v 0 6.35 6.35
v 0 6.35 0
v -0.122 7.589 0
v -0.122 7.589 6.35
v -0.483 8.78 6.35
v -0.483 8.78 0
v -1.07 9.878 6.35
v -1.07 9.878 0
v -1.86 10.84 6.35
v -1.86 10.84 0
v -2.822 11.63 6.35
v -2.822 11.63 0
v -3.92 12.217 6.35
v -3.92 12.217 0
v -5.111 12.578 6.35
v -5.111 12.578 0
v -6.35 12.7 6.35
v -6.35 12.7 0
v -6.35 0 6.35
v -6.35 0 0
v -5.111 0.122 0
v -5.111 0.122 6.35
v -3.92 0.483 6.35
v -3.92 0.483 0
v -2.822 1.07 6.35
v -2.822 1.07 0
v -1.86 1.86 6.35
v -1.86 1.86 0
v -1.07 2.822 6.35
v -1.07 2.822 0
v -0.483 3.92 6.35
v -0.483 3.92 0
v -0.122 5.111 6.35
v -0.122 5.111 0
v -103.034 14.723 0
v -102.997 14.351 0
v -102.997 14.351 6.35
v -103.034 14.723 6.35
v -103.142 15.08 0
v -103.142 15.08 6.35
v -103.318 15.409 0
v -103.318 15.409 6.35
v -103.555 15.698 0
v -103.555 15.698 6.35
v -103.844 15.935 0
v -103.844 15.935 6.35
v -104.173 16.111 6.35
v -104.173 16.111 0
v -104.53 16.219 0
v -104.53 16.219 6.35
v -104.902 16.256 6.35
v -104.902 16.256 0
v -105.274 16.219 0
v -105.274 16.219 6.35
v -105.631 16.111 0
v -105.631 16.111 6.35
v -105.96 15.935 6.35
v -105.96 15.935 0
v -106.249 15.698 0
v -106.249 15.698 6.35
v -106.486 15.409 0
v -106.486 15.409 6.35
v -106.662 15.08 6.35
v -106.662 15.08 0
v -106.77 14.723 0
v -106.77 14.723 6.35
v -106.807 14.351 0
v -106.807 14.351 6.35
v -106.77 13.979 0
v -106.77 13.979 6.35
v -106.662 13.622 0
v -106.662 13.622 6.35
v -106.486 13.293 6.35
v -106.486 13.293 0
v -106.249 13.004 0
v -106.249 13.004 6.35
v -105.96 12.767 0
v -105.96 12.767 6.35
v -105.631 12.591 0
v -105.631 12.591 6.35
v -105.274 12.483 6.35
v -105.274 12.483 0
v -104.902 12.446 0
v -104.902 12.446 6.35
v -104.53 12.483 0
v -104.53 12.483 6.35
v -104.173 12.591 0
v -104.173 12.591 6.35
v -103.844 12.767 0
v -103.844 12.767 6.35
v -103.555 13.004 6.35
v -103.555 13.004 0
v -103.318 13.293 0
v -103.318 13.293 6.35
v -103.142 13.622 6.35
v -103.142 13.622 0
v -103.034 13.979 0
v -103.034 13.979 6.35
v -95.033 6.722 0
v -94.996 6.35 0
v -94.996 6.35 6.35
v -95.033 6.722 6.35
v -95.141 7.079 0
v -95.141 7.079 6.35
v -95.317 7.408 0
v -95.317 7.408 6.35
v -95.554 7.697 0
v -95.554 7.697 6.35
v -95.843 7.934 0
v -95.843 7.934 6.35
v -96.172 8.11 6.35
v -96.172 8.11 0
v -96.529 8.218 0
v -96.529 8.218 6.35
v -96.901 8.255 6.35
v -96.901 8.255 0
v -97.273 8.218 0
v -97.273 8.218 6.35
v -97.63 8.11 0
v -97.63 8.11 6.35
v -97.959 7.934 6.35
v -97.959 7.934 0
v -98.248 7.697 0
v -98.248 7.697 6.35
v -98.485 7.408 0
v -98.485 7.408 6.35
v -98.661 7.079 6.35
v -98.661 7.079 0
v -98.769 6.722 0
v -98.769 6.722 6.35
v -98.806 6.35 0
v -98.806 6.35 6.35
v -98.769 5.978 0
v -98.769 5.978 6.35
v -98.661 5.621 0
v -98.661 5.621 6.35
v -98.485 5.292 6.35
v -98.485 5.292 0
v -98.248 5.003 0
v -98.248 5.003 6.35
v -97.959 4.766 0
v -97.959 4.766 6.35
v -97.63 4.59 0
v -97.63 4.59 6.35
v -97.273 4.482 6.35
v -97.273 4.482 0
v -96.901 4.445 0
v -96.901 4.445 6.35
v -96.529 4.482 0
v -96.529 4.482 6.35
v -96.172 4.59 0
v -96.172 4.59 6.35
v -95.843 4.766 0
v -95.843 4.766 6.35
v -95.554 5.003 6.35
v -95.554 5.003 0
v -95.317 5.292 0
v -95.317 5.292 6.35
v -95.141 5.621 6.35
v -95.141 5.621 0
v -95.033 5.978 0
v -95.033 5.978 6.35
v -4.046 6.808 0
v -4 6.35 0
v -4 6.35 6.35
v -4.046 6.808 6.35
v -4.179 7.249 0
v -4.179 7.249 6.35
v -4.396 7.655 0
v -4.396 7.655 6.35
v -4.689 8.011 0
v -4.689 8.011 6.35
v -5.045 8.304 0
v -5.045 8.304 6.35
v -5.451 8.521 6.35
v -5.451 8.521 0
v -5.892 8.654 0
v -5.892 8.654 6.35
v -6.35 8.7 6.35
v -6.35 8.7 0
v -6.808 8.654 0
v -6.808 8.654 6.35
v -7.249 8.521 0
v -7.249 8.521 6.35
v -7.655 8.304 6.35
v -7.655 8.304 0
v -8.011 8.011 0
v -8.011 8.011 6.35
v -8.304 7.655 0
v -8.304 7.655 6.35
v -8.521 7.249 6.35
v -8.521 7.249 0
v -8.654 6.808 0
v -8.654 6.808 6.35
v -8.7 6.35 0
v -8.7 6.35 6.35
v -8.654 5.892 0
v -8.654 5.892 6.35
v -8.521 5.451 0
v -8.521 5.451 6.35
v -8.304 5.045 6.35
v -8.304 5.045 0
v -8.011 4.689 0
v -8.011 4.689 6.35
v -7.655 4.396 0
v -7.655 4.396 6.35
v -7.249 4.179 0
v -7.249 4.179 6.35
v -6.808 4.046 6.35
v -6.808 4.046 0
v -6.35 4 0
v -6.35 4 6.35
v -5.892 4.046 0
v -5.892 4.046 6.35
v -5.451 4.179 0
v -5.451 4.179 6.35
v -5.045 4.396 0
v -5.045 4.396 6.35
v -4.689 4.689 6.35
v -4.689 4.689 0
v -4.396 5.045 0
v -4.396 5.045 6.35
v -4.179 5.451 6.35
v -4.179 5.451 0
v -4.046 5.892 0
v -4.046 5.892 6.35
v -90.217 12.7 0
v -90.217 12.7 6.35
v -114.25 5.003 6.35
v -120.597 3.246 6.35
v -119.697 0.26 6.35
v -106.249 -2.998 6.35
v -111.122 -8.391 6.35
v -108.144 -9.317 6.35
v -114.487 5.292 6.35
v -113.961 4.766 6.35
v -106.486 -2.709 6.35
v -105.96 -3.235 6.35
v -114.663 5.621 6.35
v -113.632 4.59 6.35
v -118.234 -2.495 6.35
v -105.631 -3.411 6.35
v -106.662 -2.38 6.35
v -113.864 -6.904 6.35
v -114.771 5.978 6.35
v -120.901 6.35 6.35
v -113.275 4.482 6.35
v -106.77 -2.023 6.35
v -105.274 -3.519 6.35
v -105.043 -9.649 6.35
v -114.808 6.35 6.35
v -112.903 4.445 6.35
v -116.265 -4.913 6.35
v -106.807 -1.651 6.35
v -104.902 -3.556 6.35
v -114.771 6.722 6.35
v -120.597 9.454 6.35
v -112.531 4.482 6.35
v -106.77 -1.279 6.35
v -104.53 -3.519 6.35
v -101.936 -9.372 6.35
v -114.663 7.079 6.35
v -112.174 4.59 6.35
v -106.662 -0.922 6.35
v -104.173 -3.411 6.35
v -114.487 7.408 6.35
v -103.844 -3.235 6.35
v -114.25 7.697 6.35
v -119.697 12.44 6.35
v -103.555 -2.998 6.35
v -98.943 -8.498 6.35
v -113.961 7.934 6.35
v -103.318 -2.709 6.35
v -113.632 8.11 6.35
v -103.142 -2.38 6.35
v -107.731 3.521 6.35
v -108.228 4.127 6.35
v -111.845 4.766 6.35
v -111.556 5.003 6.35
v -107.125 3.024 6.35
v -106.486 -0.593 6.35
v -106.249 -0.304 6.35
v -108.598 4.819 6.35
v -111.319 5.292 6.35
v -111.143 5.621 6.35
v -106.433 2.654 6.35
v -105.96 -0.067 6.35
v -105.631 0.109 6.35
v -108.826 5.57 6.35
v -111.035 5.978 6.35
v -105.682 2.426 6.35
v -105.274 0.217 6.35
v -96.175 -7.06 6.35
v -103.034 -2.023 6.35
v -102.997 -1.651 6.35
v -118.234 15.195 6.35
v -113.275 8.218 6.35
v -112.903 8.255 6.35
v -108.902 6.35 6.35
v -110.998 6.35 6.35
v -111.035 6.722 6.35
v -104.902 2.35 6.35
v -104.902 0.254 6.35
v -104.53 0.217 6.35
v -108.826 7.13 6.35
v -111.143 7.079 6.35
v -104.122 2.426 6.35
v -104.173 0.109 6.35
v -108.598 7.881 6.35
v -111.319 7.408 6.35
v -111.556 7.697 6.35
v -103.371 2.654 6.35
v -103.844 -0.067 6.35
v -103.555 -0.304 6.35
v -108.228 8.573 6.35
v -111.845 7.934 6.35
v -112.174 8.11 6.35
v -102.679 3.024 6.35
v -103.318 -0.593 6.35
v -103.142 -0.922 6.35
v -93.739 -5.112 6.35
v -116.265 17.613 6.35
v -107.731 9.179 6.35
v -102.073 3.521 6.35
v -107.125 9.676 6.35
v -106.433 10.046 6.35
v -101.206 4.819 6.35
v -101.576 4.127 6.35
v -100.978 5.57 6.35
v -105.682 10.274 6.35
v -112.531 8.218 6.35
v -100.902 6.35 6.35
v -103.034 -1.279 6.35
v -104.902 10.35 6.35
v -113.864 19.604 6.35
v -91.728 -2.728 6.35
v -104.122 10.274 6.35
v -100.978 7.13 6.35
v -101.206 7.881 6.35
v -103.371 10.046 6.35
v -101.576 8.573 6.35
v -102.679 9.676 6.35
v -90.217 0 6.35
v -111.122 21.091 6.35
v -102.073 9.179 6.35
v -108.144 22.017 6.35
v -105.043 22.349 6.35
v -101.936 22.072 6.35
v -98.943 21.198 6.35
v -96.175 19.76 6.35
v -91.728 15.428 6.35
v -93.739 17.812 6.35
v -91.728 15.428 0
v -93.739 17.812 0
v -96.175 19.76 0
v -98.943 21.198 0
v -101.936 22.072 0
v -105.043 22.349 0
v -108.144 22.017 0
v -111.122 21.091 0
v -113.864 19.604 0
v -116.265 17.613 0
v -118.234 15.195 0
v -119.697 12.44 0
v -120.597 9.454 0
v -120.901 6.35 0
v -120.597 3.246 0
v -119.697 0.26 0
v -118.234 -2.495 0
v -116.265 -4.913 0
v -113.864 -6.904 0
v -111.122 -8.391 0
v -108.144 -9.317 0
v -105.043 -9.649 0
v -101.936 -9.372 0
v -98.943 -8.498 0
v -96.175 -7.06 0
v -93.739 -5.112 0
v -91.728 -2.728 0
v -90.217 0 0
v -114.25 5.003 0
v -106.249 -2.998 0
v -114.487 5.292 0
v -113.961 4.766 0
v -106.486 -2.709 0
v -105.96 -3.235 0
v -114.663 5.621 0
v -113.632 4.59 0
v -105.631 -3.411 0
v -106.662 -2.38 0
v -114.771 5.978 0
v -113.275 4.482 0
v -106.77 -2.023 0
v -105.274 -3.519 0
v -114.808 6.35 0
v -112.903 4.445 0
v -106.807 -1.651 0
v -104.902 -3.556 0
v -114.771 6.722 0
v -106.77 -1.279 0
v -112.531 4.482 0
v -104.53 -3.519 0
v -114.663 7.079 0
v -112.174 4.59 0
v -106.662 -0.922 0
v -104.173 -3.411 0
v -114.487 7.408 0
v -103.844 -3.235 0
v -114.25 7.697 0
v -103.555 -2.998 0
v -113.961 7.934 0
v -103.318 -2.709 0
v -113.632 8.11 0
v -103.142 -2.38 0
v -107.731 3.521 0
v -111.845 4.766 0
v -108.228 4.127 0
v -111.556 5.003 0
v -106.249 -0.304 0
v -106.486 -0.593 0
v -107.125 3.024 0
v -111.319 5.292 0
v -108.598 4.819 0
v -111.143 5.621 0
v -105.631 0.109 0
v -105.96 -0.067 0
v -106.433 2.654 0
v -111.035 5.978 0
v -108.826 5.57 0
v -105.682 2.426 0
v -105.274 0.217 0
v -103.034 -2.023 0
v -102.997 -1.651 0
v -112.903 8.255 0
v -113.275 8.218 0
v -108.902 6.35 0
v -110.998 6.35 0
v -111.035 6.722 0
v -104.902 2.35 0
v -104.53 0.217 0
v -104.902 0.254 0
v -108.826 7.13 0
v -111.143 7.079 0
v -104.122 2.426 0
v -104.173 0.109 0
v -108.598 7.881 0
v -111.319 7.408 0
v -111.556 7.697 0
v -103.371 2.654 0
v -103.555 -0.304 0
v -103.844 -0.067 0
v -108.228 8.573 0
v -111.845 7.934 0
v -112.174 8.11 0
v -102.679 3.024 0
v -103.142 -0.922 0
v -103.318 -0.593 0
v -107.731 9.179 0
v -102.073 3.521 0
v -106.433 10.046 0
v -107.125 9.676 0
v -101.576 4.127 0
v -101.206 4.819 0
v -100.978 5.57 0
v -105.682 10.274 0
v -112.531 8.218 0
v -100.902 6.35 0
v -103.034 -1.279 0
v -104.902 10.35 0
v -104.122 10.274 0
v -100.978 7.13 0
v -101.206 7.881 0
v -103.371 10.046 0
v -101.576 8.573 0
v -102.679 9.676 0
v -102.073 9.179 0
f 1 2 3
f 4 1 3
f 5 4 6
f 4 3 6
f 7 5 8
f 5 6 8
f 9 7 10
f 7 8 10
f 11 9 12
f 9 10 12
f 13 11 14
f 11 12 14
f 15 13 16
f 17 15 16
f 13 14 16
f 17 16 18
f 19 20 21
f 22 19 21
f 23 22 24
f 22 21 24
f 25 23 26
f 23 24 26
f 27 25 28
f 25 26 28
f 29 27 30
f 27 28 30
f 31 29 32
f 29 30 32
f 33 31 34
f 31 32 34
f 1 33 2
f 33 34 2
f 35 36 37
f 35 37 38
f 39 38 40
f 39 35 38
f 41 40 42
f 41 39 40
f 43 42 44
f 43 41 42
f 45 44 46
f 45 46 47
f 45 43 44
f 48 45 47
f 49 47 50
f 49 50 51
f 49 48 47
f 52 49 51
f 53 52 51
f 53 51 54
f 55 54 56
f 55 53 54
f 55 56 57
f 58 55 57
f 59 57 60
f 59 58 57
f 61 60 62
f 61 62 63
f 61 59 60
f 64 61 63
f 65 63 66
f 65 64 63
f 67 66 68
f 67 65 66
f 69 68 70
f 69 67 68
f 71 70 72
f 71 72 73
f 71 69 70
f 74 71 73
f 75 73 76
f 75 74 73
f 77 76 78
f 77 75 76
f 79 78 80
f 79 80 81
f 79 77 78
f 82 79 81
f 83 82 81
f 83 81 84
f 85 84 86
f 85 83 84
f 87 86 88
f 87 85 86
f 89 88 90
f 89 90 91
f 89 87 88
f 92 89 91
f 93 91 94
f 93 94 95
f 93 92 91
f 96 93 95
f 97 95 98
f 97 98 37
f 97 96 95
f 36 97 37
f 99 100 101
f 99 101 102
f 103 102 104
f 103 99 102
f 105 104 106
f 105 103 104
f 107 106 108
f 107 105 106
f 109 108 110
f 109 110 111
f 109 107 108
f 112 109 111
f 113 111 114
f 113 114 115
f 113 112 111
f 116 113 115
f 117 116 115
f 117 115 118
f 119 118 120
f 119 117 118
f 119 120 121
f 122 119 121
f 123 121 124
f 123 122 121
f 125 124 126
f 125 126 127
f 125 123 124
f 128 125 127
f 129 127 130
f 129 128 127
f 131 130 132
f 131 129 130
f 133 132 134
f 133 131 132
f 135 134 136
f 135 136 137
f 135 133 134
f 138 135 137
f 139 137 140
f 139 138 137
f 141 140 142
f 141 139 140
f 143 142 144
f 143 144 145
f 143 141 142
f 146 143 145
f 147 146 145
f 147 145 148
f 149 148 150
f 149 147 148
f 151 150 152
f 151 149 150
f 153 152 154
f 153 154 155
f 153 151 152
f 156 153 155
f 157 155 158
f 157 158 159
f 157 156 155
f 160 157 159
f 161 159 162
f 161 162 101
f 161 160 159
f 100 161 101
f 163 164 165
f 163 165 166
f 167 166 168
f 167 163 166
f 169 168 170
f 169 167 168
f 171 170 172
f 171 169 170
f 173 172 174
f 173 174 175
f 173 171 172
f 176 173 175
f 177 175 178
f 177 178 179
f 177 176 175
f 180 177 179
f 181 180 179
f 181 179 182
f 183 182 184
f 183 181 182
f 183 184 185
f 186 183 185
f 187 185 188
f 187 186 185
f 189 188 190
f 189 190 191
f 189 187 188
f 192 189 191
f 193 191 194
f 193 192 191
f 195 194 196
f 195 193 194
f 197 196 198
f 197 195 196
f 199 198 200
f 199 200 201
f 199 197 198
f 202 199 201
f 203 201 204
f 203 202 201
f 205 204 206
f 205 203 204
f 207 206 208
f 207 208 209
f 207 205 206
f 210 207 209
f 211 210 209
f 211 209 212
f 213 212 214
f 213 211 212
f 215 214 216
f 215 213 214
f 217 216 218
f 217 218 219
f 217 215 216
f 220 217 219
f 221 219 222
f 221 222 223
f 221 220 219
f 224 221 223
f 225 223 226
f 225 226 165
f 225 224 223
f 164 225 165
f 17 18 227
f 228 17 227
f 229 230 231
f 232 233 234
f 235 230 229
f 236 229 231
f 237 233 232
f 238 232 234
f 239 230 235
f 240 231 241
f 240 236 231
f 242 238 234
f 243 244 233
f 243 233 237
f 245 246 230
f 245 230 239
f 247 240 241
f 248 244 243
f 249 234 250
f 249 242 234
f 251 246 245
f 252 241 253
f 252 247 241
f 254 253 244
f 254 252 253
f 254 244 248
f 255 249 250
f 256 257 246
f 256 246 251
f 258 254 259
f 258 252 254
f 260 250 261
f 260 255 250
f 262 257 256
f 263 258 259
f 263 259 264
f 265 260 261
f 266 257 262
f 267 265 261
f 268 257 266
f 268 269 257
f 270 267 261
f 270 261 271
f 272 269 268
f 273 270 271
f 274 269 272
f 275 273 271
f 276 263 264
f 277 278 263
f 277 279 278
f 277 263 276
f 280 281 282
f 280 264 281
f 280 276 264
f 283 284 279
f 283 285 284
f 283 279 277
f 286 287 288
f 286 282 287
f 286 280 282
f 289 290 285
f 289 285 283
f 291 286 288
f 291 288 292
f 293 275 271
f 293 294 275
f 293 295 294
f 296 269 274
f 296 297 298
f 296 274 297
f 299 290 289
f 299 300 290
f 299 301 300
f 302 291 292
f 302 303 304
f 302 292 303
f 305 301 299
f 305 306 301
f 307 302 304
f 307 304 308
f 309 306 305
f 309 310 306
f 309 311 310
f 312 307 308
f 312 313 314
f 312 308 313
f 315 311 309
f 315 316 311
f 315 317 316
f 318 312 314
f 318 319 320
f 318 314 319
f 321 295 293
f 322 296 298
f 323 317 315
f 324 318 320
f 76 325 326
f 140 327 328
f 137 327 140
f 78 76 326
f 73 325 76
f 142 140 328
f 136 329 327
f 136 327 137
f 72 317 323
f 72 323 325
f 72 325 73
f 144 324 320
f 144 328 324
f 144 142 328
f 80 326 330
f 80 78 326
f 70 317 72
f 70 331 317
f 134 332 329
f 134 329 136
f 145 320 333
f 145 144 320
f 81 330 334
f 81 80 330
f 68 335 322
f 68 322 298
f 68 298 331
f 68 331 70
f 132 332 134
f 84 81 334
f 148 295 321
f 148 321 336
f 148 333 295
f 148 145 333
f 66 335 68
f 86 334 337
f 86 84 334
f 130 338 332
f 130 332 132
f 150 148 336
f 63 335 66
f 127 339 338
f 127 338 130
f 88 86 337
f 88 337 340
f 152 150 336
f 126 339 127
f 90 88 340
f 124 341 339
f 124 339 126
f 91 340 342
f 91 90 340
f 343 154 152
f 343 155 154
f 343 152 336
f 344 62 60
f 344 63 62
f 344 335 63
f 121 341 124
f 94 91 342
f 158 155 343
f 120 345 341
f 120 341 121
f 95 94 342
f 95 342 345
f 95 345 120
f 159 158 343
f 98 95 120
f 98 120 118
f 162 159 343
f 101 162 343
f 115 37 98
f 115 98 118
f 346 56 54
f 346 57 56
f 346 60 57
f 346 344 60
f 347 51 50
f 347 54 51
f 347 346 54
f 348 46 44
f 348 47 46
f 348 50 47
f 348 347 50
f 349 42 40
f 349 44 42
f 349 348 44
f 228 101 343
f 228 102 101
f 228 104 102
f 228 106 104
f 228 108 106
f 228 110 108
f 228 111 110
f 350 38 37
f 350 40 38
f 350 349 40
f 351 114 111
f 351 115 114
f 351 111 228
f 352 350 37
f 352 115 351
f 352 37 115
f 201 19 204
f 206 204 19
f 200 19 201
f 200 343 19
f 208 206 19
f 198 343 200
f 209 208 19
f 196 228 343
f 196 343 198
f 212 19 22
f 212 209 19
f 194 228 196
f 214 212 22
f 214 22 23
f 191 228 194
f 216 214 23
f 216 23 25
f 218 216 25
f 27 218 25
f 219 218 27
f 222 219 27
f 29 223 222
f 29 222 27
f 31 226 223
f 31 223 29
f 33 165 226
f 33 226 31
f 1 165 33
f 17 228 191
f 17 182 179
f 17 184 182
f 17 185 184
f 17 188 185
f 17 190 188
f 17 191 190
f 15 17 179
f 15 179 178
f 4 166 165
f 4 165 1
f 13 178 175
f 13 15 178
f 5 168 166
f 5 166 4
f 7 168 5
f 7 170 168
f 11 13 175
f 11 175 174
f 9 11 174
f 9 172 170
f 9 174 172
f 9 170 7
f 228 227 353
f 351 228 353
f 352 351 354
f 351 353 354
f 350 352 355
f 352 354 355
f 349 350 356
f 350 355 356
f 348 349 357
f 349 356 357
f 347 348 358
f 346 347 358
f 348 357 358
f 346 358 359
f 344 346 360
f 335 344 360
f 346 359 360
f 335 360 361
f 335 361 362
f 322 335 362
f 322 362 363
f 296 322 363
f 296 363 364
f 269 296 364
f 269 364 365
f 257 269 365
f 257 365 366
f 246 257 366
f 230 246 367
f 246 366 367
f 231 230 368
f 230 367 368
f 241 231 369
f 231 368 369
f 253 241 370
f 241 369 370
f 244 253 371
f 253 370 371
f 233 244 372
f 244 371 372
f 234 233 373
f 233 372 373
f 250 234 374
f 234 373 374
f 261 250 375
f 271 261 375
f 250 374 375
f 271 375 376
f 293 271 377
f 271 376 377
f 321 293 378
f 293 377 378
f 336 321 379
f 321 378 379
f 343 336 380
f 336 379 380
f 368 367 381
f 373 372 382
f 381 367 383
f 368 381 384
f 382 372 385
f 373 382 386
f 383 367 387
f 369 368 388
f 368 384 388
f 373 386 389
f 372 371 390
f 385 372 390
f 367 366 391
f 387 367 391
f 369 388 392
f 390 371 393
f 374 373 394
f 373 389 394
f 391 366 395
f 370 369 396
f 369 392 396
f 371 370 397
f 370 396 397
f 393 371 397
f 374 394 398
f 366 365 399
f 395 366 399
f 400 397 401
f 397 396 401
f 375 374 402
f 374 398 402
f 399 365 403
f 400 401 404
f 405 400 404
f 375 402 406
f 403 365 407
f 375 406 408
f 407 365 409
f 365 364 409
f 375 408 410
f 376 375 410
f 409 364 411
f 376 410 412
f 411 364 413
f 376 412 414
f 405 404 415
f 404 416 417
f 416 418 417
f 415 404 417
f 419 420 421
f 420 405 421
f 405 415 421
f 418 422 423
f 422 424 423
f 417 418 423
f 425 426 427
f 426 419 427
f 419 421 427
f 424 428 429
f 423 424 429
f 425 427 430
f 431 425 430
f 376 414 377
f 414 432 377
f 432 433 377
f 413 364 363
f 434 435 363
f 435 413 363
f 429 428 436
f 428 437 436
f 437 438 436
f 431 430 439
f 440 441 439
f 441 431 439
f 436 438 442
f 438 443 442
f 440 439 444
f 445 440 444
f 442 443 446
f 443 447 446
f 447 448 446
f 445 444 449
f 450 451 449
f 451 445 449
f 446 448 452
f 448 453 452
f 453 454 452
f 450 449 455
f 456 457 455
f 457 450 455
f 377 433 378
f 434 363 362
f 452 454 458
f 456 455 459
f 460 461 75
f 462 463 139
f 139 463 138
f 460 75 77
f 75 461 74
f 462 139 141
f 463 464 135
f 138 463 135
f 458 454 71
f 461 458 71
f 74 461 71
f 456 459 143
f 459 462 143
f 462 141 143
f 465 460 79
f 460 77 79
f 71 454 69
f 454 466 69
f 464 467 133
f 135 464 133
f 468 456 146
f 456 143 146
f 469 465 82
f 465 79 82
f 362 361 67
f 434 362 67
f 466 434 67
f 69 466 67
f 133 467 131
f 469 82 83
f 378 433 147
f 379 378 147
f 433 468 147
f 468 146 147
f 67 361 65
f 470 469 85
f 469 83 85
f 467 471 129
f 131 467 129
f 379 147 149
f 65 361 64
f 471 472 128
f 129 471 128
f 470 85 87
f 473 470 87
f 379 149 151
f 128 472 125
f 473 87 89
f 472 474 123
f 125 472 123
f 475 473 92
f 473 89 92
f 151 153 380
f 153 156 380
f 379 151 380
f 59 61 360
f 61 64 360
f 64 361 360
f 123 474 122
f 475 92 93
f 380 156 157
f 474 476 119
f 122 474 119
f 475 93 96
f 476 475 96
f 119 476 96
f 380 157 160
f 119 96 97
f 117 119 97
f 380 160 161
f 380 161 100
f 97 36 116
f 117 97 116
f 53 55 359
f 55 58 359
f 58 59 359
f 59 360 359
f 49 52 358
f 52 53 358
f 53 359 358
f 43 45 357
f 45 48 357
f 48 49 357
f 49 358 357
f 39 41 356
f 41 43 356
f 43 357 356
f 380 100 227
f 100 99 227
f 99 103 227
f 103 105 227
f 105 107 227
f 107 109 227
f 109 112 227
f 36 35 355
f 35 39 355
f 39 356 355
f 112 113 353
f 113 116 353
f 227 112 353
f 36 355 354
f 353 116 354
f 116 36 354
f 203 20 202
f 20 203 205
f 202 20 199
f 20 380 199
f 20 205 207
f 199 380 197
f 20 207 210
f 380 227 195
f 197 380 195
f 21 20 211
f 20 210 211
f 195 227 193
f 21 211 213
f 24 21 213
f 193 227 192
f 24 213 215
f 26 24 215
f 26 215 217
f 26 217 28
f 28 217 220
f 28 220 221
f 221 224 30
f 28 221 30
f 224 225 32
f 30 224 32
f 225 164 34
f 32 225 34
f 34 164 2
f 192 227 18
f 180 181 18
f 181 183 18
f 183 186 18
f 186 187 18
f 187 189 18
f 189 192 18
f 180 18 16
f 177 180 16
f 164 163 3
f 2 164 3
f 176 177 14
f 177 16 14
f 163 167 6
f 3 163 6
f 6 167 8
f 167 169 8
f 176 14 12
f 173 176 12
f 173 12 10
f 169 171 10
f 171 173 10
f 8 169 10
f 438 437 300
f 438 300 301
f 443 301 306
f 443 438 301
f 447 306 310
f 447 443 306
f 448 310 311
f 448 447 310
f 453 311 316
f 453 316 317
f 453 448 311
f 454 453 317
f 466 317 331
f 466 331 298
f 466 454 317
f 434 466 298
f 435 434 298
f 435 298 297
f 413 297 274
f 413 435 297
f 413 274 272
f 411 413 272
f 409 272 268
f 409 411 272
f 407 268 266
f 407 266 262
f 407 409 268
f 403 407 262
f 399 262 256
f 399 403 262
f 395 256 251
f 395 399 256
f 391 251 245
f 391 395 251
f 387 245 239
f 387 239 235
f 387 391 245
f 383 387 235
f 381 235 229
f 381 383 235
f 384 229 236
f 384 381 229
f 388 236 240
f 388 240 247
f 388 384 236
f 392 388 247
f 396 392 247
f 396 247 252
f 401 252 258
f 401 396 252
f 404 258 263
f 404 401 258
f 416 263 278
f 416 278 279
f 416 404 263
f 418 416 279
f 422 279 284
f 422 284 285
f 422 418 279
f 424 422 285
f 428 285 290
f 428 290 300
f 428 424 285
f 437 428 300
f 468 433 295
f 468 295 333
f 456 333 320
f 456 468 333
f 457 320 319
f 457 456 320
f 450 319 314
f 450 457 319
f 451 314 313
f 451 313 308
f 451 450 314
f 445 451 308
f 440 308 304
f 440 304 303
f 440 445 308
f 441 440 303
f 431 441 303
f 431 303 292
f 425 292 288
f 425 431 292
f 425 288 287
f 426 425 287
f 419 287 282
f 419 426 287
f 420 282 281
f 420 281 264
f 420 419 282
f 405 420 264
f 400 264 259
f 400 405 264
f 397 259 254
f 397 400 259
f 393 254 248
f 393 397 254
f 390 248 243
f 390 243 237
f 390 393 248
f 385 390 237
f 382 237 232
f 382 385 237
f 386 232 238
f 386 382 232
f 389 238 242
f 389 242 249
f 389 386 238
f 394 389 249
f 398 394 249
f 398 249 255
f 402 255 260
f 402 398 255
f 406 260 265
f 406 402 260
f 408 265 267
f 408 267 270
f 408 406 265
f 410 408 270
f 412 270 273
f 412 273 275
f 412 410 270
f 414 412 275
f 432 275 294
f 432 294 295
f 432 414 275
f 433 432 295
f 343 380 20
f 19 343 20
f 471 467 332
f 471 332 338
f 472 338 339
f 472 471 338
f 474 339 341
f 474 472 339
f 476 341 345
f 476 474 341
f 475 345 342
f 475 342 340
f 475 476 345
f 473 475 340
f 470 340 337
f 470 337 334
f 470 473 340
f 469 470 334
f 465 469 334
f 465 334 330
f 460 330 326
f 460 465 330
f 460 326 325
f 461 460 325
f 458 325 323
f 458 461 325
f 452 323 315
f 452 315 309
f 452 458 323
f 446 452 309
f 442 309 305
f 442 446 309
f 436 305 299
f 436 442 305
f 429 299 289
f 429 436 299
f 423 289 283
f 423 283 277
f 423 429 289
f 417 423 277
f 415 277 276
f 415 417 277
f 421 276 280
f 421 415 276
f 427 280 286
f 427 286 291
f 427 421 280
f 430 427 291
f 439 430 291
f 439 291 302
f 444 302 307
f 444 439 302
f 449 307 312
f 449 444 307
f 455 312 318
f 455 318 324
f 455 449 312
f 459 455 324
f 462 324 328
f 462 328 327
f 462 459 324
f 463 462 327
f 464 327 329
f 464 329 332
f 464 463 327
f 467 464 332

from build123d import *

# Parameters (mm, degrees)
F0_R     = 1.905
F0_R_2   = 4.0005
F0_R_3   = 2.3495
F1_DEPTH = 6.35


with BuildPart() as f1:
    # F0 (on Top) → F1 (new body)
    with BuildSketch(Plane.XY):
        with BuildLine():
            ThreePointArc((0, 6.35), (-1.859872, 10.840128), (-6.35, 12.7))
            Line((-6.35, 12.7), (-88.9, 12.7))
            Line((-88.9, 12.7), (-90.216626, 12.7))
            ThreePointArc((-90.216626, 12.7), (-120.90146, 6.35), (-90.216626, 0))
            Line((-90.216626, 0), (-88.9, 0))
            Line((-88.9, 0), (-6.35, 0))
            ThreePointArc((-6.35, 0), (-1.859872, 1.859872), (0, 6.35))
        make_face()
        with Locations((-104.902, -1.651)):
            Circle(F0_R, mode=Mode.SUBTRACT)
        with Locations((-112.903, 6.35)):
            Circle(F0_R, mode=Mode.SUBTRACT)
        with Locations((-104.902, 6.35)):
            Circle(F0_R_2, mode=Mode.SUBTRACT)
        with Locations((-96.901, 6.35)):
            Circle(F0_R, mode=Mode.SUBTRACT)
        with Locations((-104.902, 14.351)):
            Circle(F0_R, mode=Mode.SUBTRACT)
        with Locations((-6.35, 6.35)):
            Circle(F0_R_3, mode=Mode.SUBTRACT)
    extrude(amount=F1_DEPTH)


solid = f1.part
